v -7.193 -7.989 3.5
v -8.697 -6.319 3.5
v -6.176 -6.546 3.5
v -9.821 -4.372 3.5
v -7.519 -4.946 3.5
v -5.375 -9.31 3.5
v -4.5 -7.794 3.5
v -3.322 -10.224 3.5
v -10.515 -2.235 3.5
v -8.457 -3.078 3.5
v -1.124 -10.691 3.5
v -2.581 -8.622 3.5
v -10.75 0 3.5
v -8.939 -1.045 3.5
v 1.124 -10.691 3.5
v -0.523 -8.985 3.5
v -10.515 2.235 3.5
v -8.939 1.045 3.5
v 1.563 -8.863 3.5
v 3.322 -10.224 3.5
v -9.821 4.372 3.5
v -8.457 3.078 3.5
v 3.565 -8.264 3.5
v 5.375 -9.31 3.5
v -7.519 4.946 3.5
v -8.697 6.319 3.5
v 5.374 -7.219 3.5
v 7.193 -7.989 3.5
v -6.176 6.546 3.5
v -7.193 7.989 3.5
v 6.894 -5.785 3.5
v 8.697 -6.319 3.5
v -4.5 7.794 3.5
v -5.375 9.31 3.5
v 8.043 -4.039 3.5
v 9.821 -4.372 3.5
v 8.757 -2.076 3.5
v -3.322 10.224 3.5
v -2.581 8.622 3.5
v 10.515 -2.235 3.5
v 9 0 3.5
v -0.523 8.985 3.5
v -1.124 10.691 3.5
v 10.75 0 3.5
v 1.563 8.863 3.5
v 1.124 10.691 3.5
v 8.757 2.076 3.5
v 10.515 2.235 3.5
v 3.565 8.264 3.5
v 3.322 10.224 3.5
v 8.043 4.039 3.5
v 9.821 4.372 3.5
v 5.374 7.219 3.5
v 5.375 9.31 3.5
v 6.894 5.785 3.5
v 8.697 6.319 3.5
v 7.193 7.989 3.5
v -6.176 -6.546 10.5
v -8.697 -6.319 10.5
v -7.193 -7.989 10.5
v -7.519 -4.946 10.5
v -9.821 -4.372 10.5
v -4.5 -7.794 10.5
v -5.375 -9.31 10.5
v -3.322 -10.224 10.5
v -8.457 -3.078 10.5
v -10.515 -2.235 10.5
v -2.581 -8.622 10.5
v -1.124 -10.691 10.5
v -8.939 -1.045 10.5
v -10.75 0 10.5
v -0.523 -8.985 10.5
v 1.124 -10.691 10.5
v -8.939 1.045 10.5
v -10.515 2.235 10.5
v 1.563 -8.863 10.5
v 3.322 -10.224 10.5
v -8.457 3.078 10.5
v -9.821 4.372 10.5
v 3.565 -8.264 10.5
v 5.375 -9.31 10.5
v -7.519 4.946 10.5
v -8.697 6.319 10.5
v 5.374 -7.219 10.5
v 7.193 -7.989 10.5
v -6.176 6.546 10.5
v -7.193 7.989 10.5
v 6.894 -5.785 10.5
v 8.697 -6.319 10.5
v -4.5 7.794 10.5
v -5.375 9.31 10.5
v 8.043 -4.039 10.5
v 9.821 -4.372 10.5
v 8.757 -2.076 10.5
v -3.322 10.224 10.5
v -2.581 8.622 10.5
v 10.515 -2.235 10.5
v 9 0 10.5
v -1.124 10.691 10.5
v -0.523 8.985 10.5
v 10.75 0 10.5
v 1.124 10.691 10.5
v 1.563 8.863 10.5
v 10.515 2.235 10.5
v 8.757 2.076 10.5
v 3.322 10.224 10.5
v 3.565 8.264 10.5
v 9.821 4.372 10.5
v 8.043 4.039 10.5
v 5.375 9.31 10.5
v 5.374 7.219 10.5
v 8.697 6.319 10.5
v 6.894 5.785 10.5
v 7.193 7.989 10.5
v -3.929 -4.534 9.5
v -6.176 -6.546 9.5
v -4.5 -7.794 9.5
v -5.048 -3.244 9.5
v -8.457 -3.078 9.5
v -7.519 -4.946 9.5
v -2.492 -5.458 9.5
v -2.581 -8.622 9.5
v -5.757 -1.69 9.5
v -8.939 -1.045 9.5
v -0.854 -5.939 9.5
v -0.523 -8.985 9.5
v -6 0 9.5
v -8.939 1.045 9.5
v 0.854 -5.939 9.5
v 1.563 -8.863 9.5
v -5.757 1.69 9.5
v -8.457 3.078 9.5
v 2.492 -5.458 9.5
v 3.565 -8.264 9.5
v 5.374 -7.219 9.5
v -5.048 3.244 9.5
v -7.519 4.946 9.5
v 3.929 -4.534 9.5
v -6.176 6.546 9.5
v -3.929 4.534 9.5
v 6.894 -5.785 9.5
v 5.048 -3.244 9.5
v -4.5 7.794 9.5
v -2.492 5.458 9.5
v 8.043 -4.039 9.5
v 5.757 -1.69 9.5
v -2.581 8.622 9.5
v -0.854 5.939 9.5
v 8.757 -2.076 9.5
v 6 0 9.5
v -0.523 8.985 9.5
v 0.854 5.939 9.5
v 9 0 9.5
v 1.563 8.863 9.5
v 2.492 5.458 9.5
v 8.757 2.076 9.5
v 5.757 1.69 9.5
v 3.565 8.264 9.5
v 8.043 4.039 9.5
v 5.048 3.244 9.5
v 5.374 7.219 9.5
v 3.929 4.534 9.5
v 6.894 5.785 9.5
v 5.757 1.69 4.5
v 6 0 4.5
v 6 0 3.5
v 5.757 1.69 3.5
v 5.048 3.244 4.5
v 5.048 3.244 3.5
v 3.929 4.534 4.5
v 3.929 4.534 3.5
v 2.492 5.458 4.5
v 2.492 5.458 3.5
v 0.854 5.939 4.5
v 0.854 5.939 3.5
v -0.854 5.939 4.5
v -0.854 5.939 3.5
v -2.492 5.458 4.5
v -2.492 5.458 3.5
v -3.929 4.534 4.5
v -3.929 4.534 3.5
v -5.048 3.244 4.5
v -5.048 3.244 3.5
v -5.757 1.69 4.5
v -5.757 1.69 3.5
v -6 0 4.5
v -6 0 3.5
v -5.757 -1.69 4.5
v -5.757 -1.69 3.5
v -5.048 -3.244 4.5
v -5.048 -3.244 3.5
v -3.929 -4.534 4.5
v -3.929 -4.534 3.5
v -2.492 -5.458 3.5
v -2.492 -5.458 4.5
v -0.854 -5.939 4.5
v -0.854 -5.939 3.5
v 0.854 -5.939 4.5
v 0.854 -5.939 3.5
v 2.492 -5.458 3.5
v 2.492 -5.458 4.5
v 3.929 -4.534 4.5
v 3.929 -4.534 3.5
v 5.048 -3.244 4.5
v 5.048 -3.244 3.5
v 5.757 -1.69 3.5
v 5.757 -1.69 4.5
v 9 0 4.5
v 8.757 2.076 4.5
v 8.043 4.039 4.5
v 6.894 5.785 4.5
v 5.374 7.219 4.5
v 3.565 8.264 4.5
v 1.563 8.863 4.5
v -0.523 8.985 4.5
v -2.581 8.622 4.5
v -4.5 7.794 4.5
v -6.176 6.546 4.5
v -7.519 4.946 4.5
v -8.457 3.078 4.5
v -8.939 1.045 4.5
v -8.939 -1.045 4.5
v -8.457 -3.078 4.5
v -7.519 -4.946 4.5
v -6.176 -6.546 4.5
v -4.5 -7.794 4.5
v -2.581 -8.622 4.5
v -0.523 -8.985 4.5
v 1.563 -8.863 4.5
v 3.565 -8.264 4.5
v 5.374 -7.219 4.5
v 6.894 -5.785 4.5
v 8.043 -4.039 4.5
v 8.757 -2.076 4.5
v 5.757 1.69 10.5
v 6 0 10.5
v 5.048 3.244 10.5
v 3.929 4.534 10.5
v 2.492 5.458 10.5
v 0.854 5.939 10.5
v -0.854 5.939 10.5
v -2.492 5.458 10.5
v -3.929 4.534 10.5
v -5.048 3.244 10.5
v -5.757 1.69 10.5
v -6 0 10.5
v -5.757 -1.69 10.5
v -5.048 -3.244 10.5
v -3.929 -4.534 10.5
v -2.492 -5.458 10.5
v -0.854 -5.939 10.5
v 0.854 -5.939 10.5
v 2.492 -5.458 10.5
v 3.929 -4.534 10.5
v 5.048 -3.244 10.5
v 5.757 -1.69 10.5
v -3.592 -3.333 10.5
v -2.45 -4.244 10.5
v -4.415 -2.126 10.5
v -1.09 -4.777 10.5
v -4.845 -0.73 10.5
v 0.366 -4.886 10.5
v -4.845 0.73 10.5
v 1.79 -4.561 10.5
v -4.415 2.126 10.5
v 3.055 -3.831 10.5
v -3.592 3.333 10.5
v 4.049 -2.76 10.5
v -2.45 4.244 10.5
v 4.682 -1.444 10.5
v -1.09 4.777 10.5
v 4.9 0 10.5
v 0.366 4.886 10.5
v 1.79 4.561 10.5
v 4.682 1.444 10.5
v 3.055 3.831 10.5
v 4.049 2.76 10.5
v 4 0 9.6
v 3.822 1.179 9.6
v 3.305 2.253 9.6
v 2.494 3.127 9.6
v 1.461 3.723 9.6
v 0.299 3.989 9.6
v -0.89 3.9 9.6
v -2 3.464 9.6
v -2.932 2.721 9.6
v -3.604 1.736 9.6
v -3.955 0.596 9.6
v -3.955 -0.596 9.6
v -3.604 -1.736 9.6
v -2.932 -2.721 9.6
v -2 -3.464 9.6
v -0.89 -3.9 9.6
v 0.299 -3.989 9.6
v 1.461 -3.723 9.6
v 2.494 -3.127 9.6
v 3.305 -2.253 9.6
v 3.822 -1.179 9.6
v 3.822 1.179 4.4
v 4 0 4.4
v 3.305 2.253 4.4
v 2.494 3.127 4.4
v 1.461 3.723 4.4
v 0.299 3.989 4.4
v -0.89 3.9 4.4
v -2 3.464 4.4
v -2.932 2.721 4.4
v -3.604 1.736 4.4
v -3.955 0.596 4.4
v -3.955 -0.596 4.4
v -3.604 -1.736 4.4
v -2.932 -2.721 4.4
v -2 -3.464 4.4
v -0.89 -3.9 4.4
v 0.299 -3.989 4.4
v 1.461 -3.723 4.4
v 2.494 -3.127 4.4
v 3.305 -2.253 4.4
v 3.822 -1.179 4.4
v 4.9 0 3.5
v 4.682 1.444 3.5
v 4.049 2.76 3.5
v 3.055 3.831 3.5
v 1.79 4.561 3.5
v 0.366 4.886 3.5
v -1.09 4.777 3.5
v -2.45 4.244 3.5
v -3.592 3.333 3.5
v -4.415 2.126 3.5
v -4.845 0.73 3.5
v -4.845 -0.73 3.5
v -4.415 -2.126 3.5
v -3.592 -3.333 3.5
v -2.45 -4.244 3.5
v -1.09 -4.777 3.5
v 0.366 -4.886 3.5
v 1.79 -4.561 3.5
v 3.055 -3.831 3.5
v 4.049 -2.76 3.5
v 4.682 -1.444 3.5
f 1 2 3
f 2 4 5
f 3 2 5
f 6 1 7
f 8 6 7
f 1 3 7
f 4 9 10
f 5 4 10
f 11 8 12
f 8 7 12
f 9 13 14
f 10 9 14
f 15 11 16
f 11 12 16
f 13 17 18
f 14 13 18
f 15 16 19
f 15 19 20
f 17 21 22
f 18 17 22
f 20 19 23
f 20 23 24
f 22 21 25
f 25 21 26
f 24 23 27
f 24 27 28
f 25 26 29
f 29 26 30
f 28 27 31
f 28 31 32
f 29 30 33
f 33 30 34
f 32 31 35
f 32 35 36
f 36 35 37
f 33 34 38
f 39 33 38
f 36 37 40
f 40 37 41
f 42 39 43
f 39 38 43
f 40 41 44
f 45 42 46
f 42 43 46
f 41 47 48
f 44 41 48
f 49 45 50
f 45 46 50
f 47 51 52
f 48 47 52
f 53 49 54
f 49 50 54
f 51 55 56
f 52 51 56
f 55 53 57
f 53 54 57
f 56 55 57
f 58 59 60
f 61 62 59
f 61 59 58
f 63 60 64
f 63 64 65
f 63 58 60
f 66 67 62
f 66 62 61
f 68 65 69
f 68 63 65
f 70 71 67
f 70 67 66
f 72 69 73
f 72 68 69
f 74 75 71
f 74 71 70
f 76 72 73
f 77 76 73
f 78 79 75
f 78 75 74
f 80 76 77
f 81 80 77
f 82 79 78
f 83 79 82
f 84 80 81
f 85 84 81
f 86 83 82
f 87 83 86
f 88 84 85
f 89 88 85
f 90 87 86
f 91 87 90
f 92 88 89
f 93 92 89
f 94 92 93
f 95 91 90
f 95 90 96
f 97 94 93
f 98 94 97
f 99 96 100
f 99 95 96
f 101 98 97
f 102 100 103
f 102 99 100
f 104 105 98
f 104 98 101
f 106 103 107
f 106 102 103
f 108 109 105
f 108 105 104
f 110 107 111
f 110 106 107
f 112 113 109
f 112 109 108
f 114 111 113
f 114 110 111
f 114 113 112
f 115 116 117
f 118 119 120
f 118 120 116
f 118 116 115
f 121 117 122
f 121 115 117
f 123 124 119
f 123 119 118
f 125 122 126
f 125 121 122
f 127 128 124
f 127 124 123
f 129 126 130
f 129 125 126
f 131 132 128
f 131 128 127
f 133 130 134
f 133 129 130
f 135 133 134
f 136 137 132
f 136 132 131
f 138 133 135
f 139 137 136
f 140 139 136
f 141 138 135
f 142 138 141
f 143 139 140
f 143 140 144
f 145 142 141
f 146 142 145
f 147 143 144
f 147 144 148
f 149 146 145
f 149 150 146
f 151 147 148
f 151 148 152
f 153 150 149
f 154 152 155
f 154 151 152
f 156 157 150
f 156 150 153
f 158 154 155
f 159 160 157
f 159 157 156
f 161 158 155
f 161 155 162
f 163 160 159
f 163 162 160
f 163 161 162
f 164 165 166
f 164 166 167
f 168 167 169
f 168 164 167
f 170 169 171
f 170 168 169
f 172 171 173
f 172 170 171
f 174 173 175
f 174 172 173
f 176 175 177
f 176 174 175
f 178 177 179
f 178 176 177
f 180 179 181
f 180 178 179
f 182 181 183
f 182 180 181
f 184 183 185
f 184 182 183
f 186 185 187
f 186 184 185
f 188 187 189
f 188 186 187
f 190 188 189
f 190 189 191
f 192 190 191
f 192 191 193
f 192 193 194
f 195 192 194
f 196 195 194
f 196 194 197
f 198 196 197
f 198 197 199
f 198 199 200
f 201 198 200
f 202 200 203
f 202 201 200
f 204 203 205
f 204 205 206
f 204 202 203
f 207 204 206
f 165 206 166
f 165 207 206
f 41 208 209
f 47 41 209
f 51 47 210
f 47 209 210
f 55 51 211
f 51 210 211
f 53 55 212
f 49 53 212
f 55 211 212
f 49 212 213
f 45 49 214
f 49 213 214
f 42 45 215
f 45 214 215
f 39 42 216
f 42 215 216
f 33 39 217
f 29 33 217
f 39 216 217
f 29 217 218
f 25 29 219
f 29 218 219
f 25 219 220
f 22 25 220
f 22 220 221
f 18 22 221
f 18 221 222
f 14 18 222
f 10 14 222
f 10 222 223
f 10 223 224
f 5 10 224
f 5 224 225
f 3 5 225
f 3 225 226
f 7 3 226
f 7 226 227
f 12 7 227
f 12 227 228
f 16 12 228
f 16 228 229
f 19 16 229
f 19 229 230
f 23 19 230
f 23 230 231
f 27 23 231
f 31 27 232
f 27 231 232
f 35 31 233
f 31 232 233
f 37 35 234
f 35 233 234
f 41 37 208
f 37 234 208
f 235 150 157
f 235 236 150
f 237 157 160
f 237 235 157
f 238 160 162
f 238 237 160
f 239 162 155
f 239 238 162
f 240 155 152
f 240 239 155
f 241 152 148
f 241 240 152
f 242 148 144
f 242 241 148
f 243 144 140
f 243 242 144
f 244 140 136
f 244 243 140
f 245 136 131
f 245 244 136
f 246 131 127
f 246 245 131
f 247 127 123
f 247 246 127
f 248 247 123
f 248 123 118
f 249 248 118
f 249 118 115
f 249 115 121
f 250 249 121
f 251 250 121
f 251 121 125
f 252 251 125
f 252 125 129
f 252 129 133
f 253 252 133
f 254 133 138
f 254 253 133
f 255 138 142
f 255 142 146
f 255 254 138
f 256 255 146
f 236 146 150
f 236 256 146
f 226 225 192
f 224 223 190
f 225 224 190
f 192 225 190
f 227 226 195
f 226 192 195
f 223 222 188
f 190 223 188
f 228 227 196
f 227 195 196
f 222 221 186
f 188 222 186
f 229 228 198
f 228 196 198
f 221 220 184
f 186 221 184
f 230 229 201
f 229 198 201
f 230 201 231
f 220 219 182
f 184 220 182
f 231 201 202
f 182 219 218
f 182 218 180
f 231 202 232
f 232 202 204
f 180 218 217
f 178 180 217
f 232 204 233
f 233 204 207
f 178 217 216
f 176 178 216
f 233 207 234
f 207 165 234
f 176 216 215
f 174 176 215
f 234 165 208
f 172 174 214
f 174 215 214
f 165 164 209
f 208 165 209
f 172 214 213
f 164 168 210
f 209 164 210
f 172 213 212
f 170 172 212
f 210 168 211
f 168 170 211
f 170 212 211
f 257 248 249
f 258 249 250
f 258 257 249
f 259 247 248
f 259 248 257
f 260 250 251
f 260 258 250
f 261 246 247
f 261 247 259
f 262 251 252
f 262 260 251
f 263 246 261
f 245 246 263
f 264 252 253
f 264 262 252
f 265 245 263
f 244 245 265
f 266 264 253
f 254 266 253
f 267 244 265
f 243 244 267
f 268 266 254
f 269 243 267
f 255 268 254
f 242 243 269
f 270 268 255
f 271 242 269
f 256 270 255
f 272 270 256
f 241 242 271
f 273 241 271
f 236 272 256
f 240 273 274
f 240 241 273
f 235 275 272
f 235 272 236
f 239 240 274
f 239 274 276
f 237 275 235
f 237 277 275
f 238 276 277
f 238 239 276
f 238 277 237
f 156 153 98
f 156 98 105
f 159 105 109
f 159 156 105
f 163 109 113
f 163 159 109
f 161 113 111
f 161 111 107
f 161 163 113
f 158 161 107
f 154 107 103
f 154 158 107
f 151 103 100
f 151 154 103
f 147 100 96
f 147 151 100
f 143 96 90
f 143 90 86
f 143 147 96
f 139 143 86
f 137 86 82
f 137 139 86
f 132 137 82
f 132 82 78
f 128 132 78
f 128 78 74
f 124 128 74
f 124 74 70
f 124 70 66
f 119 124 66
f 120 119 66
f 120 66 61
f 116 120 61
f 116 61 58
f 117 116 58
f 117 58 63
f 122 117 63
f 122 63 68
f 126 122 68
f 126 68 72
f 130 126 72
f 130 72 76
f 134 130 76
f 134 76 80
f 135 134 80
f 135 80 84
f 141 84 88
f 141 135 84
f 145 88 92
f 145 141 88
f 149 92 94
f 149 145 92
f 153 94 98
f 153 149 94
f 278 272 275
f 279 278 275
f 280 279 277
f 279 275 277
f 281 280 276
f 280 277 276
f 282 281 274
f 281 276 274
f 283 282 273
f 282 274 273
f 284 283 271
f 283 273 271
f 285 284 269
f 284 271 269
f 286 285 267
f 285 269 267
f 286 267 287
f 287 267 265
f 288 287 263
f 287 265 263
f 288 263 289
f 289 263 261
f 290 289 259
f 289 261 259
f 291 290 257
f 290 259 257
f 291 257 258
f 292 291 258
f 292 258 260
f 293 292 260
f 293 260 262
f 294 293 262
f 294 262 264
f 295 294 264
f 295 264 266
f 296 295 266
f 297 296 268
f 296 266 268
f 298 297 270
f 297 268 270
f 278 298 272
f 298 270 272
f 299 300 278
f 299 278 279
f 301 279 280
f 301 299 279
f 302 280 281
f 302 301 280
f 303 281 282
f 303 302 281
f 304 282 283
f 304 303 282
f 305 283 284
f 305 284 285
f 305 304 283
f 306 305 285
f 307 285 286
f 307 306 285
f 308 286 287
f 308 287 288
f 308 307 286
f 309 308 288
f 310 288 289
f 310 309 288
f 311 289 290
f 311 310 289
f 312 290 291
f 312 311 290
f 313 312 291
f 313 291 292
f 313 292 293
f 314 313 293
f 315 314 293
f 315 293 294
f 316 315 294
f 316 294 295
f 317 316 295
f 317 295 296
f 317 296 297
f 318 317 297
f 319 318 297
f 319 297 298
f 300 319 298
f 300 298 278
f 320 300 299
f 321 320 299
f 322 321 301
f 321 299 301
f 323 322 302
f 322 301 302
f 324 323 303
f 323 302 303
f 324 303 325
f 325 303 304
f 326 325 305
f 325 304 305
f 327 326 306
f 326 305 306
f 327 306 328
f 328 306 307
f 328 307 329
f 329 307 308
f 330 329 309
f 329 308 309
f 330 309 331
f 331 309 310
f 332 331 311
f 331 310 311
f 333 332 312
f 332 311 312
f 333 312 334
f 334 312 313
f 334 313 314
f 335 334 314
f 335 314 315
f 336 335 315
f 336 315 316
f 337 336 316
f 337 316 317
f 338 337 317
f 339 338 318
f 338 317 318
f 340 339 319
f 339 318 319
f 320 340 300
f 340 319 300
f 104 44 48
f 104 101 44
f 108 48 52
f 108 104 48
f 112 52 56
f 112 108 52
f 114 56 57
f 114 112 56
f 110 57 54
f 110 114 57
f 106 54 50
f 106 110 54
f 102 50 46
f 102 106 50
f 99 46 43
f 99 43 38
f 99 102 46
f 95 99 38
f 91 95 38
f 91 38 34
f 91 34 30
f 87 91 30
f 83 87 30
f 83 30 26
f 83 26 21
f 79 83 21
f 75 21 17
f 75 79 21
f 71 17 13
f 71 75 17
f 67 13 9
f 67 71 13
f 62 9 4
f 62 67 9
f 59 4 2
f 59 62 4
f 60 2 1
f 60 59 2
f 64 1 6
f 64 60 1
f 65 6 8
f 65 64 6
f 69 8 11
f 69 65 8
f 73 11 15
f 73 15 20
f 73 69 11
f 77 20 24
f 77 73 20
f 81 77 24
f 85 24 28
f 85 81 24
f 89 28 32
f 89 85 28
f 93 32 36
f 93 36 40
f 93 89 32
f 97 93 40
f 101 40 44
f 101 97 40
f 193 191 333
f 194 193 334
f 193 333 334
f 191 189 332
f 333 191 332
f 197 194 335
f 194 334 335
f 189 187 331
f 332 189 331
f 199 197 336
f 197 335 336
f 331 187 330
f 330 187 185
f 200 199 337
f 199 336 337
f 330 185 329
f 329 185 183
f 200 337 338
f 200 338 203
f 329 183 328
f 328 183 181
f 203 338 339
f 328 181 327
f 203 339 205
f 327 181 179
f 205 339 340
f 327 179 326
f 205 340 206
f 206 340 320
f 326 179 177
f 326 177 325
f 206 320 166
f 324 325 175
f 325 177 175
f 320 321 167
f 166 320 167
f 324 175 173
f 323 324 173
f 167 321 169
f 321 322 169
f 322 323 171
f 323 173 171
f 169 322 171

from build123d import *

# Parameters (mm, degrees)
F0_R     = 9
F0_R_2   = 6
F1_DEPTH = 2.5
F0_R_3   = 10.75
F0_R_4   = 4
F2_DEPTH = 3.5
F4_SIZE  = 0.9


with BuildPart() as f1:
    # F0 (on Top) → F1 (new body, symmetric)
    with BuildSketch(Plane.XY):
        Circle(F0_R)
        Circle(F0_R_2, mode=Mode.SUBTRACT)
    extrude(amount=F1_DEPTH, both=True)

    # F0 (on Top) → F2 (join, symmetric)
    with BuildSketch(Plane.XY):
        Circle(F0_R_3)
        Circle(F0_R, mode=Mode.SUBTRACT)
        Circle(F0_R_2)
        Circle(F0_R_4, mode=Mode.SUBTRACT)
    extrude(amount=F2_DEPTH, both=True)


with BuildPart() as f1_1:
    # F3: moved
    add(f1.part.moved(Location((0, 0, 4.5))))

    # F4
    f4_edges = [f1_1.edges().sort_by_distance(p)[0] for p in [
        (-4, 0, 8),
        (-4, 0, 1),
    ]]
    chamfer(f4_edges, length=F4_SIZE)


with BuildPart() as f1_2:
    # F5: moved
    add(f1_1.part.moved(Location((0, 0, 2.5))))


solid = f1_2.part
